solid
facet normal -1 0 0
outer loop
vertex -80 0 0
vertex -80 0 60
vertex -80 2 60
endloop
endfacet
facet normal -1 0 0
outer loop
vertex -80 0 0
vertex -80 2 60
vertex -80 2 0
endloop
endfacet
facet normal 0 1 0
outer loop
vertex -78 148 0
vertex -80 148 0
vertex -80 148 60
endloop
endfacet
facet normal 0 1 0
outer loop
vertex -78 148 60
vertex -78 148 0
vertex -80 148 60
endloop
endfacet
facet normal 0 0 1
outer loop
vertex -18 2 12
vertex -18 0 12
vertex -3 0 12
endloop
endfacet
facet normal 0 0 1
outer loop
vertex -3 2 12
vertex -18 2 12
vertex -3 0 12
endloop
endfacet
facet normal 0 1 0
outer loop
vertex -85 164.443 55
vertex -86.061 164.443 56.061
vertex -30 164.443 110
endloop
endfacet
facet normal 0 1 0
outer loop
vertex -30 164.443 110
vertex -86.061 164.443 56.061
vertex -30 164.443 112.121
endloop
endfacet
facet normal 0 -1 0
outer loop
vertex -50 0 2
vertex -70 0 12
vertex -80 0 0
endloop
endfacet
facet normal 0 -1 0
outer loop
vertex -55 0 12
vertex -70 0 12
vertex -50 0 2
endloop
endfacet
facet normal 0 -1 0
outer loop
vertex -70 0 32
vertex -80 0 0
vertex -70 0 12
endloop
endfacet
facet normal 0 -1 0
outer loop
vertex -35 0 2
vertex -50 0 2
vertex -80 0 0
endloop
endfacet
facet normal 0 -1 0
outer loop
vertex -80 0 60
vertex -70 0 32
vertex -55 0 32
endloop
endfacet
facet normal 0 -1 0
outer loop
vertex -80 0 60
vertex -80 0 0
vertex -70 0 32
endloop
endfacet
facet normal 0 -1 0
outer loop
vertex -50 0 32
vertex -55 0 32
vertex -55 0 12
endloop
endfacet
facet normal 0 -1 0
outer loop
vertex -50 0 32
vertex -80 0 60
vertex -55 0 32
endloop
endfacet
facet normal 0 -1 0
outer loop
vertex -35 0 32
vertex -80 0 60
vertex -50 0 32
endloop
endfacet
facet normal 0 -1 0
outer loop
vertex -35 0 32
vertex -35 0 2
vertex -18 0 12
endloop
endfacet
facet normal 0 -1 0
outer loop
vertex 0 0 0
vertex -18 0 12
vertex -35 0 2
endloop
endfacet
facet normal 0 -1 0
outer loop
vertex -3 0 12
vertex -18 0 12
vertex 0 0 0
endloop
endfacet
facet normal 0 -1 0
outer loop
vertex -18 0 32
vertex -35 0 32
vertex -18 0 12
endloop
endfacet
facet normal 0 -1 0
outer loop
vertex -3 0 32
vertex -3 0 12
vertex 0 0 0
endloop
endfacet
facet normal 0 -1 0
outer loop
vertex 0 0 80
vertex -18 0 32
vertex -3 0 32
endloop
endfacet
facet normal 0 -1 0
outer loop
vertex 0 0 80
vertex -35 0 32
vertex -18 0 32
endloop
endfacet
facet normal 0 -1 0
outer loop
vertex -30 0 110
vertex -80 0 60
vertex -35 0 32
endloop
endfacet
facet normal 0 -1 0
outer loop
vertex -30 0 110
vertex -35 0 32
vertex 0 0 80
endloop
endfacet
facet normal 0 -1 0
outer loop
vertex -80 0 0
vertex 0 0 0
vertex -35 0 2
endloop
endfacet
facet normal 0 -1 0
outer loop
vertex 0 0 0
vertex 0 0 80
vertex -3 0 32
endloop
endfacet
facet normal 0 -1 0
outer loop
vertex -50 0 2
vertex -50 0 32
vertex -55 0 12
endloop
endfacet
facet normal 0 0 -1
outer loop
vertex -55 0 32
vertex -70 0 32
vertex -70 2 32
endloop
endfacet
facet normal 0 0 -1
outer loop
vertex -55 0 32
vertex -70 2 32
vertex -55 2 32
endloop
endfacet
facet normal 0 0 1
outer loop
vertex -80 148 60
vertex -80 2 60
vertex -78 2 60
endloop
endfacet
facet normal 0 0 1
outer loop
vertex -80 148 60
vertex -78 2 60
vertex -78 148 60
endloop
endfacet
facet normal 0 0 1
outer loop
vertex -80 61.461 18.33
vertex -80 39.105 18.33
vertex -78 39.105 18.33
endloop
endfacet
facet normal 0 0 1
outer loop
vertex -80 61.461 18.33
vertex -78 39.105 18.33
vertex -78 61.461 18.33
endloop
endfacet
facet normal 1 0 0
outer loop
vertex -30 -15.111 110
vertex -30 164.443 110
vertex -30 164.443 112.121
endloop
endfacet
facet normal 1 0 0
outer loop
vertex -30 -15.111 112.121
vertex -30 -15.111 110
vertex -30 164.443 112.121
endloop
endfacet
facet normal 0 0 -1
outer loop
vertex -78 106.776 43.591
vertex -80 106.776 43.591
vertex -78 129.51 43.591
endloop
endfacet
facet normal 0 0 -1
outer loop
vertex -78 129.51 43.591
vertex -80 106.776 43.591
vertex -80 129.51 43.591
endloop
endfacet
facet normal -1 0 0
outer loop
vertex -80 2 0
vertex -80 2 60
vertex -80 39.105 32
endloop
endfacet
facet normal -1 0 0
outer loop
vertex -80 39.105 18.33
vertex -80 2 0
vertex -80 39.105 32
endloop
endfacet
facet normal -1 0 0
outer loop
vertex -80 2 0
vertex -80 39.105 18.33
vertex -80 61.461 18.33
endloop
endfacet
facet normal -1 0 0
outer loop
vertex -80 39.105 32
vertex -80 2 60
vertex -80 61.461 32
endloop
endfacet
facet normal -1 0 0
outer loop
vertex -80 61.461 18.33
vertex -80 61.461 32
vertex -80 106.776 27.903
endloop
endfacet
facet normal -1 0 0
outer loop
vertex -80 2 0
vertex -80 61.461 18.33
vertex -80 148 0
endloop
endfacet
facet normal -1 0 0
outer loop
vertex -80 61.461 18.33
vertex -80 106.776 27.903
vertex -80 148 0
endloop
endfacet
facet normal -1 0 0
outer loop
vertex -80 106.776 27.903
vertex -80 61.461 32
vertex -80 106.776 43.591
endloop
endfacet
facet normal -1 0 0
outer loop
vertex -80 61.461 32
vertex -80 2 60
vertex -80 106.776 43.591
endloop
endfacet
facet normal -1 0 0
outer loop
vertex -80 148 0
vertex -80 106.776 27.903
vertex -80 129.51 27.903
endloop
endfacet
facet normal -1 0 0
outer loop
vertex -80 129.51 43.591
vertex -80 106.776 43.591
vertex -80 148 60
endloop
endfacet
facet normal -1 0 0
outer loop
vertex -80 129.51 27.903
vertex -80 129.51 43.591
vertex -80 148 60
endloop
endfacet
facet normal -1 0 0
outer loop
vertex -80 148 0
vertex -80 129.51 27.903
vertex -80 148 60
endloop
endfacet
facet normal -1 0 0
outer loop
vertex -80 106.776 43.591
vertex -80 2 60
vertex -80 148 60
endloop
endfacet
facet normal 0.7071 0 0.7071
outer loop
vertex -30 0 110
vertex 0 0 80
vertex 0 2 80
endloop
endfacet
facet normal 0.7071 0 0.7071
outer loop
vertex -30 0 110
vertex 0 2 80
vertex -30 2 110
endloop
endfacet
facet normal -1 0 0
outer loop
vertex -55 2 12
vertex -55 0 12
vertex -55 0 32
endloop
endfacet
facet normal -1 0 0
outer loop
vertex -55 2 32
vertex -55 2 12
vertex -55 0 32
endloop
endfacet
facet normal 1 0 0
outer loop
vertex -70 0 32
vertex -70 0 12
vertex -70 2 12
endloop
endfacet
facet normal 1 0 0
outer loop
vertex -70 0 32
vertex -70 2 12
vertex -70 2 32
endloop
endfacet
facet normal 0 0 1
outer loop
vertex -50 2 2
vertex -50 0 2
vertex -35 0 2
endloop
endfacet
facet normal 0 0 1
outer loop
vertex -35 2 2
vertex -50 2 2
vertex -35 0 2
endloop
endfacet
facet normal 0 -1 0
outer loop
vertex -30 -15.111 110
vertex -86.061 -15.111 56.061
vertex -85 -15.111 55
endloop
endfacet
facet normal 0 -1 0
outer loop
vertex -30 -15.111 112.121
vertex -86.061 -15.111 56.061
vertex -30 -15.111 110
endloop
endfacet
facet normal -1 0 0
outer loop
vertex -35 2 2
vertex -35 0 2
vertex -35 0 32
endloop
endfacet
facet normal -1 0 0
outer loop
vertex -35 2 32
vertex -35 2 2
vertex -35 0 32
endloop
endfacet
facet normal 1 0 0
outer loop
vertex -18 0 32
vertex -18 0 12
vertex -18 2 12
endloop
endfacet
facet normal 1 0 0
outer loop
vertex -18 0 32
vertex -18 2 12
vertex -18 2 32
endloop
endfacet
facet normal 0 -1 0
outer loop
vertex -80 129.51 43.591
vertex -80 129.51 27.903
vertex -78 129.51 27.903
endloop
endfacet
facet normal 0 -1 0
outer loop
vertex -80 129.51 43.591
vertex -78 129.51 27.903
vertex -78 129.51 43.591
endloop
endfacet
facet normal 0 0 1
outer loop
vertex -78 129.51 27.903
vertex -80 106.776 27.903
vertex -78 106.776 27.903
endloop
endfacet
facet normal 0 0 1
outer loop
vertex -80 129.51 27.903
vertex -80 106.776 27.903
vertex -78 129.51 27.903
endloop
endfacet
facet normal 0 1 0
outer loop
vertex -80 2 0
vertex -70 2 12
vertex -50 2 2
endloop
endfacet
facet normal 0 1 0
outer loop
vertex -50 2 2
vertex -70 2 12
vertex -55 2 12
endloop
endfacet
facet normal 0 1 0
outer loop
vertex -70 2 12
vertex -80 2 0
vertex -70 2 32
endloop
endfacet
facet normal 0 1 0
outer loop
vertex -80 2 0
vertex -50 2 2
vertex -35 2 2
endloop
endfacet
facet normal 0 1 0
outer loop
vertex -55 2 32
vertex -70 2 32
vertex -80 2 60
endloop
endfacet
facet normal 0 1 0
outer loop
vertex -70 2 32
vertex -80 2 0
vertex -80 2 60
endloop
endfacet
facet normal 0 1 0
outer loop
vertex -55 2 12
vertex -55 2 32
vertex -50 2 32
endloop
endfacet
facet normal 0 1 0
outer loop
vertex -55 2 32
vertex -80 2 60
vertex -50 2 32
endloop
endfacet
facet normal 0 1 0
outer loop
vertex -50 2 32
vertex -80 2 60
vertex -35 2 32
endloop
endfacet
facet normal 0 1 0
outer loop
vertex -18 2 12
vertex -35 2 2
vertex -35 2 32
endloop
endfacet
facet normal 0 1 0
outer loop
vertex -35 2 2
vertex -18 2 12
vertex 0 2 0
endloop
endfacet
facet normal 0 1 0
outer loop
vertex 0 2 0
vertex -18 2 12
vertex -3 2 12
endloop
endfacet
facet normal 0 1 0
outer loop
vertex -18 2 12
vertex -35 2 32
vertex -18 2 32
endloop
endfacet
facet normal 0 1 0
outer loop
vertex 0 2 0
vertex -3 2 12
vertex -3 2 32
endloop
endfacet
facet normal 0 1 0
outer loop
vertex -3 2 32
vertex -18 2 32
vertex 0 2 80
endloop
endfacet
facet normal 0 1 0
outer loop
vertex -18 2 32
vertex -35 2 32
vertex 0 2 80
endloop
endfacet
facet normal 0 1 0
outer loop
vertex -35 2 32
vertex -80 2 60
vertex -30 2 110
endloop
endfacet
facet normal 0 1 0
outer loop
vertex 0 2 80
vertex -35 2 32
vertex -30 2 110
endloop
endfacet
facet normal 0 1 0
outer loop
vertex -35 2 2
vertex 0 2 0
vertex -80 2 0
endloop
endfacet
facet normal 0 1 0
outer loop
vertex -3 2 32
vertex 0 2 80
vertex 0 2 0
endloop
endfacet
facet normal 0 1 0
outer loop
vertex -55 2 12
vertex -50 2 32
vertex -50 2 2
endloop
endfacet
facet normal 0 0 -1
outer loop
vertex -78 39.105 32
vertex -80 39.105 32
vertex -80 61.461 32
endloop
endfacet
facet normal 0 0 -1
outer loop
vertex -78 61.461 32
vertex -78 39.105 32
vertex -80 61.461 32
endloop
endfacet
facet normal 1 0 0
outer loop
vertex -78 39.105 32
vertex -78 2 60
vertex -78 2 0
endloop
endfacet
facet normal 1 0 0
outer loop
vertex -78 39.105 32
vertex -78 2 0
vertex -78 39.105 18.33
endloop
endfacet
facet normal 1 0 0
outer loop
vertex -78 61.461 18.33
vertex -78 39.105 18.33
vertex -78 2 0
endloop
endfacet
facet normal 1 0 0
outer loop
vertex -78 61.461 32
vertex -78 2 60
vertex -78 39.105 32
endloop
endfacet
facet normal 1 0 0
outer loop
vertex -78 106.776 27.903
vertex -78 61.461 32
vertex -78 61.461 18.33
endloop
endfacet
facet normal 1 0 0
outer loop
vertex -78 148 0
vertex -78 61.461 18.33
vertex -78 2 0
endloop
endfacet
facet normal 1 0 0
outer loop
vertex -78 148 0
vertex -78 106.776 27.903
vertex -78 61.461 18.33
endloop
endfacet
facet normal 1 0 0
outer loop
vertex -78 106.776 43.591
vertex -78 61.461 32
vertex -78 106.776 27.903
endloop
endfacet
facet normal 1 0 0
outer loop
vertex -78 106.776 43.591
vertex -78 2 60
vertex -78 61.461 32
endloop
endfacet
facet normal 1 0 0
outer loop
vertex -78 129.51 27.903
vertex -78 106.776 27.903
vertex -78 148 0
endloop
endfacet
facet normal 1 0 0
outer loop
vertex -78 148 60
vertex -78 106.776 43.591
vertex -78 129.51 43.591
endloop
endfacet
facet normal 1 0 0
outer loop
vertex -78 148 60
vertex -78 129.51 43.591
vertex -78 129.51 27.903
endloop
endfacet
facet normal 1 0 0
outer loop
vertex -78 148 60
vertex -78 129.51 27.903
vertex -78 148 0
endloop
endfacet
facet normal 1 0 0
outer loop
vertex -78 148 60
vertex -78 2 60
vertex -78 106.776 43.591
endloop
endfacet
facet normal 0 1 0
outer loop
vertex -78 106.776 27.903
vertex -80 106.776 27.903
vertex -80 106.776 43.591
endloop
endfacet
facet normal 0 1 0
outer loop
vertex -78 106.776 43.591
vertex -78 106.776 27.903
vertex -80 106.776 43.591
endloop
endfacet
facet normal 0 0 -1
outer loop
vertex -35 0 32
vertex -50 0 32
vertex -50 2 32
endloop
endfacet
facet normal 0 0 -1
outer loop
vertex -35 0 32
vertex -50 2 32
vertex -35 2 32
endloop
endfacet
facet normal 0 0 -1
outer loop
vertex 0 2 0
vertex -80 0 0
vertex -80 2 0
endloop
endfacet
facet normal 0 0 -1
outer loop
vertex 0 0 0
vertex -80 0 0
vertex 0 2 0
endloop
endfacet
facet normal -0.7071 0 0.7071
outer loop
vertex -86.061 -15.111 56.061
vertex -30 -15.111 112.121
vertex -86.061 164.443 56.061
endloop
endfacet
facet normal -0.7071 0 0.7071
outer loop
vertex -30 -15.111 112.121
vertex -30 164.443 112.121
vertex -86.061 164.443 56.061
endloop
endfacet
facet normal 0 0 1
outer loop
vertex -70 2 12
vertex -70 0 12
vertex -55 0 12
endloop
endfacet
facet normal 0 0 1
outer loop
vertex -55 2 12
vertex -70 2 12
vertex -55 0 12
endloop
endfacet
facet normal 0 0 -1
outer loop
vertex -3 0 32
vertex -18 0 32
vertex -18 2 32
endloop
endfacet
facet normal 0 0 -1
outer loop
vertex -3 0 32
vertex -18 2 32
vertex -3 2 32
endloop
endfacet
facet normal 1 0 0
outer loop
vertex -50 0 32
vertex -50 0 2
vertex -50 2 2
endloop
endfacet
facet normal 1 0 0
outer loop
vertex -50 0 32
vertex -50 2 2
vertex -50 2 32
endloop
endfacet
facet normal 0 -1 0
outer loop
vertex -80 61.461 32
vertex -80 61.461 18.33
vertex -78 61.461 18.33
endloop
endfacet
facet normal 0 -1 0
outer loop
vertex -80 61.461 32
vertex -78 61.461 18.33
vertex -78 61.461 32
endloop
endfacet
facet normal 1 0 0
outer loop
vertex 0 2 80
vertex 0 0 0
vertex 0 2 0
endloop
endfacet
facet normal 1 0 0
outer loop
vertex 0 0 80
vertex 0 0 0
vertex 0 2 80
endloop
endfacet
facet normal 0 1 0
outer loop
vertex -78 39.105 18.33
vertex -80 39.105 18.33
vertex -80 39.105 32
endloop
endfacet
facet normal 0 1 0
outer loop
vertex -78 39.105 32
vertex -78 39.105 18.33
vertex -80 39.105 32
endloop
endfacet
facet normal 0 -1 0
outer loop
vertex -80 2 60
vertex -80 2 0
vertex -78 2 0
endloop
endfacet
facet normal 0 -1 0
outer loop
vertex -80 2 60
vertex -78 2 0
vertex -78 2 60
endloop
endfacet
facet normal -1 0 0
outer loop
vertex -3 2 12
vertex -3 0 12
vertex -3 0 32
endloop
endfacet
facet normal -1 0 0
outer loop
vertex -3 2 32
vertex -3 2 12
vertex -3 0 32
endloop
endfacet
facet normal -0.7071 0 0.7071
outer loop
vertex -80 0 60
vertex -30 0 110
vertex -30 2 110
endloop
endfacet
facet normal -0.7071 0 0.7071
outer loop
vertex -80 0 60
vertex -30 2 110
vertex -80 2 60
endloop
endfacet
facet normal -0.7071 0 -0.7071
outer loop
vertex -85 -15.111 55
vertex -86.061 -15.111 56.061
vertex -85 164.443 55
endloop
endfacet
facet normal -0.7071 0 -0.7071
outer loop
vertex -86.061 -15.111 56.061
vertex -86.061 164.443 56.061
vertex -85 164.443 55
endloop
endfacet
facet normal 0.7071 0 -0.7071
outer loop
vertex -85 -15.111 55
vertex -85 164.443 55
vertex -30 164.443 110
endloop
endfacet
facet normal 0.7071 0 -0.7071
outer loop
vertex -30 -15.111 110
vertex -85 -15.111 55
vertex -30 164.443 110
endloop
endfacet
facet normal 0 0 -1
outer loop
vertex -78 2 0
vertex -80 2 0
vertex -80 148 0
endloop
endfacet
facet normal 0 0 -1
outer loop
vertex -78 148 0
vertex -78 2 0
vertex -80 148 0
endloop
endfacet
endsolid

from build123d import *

# Parameters (mm, degrees)
F1_W          = 15
F1_H          = 20
F1_H_2        = 30
F2_DEPTH      = 2
F4_W          = 146
F4_H          = 60
F4_W_2        = 22.3559141159
F4_H_2        = 13.6698782444
F4_W_3        = 22.733643651
F4_H_3        = 15.6874321401
F5_DEPTH      = 2
F7_DEPTH      = 164.4430011511
F7_DEPTH_BACK = 15.1107646525


with BuildPart() as f2:
    # F1 (on Front) → F2 (new body, through all)
    with BuildSketch(Plane.XZ):
        Polygon((-80, 60), (-80, 0), (0, 0), (0, 80), (-30, 110), align=None)
        with Locations((-62.5, 22)):
            Rectangle(F1_W, F1_H, mode=Mode.SUBTRACT)
        with Locations((-42.5, 17)):
            Rectangle(F1_W, F1_H_2, mode=Mode.SUBTRACT)
        with Locations((-10.5, 22)):
            Rectangle(F1_W, F1_H, mode=Mode.SUBTRACT)
    extrude(amount=-F2_DEPTH)


with BuildPart() as f5:
    # F4 (on plane+point) → F5 (new body, through all)
    with BuildSketch(Plane.YZ.offset(-80)):
        with Locations((75, 30)):
            Rectangle(F4_W, F4_H)
        with Locations((50.283376893, 25.1650608778)):
            Rectangle(F4_W_2, F4_H_2, mode=Mode.SUBTRACT)
        with Locations((118.1431487203, 35.7470754534)):
            Rectangle(F4_W_3, F4_H_3, mode=Mode.SUBTRACT)
    extrude(amount=F5_DEPTH)


with BuildPart() as f7:
    # F6 (on Front) → F7 (new body, two sides)
    with BuildSketch(Plane.XZ) as f7_sk:
        Polygon((-30, 110), (-30, 112.1213203436), (-86.0606601718, 56.0606601718), (-85, 55), align=None)
    extrude(amount=-F7_DEPTH)
    extrude(f7_sk.sketch, amount=F7_DEPTH_BACK)


solid = Compound([f2.part, f5.part, f7.part])
